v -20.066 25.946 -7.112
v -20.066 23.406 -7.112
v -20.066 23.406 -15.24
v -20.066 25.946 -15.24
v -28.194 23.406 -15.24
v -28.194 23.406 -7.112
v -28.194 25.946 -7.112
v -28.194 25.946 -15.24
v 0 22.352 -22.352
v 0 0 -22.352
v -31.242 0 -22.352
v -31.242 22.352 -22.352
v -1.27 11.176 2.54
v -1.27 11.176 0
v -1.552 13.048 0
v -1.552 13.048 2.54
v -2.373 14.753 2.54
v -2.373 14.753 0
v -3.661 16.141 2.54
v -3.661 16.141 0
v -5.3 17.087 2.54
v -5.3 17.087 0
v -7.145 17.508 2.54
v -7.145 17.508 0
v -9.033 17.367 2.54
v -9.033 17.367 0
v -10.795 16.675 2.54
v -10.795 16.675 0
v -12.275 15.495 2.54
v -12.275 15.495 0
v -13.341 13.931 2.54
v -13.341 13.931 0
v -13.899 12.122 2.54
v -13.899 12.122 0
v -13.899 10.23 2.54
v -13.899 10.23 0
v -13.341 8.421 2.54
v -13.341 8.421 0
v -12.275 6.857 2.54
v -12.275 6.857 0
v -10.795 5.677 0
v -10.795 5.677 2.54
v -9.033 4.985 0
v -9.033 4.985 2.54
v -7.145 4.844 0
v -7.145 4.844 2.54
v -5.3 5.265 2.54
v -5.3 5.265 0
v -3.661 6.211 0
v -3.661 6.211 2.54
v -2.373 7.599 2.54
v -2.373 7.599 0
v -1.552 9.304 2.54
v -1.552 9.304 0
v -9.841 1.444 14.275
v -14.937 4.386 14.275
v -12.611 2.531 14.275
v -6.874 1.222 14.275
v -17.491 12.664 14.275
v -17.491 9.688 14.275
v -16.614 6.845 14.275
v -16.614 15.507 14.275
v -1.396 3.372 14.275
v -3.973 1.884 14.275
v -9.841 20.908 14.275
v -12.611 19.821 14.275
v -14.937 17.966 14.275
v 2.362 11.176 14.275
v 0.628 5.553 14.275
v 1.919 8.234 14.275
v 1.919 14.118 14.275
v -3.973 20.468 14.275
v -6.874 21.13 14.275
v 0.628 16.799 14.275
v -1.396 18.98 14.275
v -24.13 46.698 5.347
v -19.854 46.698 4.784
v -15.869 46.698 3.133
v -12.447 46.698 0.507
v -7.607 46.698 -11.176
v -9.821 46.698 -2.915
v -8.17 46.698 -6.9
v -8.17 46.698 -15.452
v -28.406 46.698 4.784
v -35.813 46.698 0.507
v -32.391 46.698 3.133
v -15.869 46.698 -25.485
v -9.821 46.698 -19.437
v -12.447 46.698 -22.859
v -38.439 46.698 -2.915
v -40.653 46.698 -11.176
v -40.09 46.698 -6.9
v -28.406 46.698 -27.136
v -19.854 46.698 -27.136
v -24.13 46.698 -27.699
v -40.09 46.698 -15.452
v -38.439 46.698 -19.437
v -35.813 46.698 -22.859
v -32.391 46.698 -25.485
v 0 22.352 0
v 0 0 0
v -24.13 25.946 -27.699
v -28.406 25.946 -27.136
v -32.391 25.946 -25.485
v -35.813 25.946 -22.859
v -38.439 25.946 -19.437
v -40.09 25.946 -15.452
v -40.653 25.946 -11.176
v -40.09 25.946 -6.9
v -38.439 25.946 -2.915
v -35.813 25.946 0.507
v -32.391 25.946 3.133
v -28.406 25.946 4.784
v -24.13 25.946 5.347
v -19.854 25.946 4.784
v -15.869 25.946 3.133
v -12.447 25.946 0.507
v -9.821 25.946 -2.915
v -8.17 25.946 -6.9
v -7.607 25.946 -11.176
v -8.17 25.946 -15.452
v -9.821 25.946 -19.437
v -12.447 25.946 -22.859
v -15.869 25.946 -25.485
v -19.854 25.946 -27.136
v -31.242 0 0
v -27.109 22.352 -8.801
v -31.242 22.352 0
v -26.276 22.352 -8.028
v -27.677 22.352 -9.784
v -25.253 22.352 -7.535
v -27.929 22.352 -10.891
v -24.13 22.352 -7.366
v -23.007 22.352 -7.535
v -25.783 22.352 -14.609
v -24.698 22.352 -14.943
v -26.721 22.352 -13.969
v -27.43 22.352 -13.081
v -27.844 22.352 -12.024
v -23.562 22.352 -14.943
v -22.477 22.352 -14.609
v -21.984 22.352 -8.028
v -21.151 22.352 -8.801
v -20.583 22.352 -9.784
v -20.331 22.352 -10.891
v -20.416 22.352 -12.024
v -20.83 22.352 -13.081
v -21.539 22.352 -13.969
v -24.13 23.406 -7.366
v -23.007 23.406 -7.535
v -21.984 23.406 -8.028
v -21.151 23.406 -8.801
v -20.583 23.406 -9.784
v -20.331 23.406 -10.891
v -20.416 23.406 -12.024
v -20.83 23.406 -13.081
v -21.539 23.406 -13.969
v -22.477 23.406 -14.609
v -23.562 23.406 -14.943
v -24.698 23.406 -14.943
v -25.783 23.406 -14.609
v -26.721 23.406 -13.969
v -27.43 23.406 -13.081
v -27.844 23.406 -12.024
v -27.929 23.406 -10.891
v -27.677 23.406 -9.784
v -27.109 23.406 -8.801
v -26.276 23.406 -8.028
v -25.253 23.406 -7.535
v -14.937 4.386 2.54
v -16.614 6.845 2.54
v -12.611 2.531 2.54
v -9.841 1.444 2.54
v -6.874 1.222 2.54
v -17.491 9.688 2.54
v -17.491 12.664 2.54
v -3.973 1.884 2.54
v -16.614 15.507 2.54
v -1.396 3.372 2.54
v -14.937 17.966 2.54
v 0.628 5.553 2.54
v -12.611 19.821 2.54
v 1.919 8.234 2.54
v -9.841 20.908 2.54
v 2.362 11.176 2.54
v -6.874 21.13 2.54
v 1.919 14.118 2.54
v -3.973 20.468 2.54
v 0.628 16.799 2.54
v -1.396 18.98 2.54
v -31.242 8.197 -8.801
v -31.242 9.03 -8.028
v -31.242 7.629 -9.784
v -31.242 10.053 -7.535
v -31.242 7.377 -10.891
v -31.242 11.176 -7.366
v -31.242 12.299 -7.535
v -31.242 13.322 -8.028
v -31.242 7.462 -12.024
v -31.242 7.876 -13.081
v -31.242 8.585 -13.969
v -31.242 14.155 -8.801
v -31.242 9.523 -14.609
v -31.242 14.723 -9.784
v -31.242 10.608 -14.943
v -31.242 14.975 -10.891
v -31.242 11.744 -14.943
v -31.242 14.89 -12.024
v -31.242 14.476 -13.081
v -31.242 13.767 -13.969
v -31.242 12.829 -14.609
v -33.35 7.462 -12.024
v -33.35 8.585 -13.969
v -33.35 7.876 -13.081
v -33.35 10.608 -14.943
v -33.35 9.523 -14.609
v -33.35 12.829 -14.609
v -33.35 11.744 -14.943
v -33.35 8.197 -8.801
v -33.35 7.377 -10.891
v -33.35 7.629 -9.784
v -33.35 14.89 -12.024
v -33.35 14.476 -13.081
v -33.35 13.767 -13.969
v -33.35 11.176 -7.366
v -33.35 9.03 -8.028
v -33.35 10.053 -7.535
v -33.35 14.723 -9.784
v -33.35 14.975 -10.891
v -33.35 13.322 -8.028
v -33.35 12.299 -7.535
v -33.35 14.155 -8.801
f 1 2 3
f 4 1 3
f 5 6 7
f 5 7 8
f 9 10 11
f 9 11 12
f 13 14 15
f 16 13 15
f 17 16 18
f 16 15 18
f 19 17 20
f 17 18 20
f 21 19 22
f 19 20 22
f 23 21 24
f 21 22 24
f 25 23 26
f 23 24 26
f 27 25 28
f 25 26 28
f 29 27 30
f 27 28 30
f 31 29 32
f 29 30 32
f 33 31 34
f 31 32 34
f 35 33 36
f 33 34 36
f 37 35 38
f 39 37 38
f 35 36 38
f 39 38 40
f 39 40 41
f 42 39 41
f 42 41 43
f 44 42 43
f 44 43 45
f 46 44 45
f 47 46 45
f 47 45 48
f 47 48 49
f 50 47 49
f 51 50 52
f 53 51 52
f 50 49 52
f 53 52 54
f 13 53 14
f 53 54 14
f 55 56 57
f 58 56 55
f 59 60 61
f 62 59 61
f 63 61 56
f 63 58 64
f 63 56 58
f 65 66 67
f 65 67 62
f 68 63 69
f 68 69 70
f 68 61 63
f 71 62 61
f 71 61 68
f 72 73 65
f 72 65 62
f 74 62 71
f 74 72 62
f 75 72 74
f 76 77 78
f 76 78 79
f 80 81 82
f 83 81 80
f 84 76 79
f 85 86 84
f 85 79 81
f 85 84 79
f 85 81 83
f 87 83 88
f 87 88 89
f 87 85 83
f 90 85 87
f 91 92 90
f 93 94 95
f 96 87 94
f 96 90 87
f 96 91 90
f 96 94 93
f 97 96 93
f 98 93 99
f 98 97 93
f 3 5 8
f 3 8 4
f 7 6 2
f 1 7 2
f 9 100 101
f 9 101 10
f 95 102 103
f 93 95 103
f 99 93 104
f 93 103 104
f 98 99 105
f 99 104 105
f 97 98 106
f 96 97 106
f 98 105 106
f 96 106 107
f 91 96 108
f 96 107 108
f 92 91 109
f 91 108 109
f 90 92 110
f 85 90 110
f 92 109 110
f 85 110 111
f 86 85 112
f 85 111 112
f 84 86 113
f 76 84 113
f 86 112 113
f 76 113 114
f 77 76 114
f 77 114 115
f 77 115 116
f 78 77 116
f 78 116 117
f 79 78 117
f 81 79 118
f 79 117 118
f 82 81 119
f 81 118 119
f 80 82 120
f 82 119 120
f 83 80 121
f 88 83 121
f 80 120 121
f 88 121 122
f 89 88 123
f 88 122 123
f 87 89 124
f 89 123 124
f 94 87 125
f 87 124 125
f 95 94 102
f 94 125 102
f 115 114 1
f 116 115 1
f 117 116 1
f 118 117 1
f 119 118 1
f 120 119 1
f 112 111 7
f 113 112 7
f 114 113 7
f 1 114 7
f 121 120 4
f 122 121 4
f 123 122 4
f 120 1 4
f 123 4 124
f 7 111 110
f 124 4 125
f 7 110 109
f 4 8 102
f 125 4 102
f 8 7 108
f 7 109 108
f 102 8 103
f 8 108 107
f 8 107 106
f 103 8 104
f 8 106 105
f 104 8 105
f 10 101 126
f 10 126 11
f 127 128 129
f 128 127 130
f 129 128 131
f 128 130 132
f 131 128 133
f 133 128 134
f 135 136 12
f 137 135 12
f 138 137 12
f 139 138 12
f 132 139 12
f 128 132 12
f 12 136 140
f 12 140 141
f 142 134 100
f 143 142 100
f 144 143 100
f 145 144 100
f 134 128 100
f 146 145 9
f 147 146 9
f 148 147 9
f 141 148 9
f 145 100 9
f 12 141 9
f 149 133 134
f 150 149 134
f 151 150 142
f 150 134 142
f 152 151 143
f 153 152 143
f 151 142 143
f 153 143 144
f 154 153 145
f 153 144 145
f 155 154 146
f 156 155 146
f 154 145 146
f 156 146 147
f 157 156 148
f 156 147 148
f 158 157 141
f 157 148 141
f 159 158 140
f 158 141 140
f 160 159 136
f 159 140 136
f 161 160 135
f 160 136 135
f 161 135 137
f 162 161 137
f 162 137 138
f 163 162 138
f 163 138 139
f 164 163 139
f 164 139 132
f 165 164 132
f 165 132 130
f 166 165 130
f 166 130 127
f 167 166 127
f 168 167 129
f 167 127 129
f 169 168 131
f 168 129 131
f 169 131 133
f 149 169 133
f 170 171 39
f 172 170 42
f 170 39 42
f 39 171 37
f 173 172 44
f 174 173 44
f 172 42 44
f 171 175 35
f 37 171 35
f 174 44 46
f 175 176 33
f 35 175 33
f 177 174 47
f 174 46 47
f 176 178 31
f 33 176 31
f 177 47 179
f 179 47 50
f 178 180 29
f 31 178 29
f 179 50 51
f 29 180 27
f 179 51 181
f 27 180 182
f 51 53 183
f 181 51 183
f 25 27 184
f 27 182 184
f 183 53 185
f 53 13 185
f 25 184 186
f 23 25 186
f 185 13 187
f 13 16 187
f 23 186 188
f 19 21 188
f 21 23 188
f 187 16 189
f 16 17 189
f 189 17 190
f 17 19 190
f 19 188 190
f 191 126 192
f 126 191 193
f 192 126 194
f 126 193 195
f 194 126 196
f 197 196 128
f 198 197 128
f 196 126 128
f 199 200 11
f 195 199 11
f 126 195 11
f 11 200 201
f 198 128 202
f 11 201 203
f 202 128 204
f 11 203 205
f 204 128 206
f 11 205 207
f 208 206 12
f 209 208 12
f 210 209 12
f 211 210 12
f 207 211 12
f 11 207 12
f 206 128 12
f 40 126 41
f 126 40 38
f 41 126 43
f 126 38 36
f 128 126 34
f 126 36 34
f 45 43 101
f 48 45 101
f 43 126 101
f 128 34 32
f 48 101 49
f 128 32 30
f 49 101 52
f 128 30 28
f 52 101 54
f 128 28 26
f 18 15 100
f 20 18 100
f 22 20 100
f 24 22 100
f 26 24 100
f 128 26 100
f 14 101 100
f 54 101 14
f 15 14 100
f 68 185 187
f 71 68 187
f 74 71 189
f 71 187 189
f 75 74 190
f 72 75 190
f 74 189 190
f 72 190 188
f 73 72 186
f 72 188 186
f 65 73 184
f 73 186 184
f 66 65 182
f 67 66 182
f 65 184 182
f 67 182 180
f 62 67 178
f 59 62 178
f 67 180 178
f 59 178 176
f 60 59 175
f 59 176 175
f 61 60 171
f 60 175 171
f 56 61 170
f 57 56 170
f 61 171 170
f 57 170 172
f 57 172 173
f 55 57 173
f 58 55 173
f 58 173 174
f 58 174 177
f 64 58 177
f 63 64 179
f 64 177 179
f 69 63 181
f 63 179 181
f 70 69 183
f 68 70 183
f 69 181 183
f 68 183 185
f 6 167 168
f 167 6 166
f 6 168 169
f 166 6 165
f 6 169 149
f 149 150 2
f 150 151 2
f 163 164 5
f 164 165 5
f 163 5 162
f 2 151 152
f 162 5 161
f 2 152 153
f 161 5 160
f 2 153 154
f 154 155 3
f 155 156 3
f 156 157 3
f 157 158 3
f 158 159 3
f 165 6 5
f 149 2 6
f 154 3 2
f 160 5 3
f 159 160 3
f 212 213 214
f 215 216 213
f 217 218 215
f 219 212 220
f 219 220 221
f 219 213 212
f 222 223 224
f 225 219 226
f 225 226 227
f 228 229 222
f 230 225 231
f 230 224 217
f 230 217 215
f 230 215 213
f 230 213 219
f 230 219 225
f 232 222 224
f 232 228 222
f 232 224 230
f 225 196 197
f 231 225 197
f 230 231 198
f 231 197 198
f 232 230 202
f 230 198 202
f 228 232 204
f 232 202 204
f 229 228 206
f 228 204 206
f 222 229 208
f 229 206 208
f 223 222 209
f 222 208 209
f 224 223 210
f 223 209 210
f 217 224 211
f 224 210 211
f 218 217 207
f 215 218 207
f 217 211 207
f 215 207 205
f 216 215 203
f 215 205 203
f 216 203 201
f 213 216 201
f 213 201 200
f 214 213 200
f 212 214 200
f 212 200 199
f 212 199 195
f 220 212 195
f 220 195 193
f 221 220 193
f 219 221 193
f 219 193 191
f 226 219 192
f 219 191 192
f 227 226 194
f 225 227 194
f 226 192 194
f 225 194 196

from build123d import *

# Parameters (mm, degrees)
SKETCH1_W           = 22.352
SKETCH1_H           = 22.352
BOSS_EXTRUDE1_DEPTH = 31.242
SKETCH2_R           = 3.81
BOSS_EXTRUDE2_DEPTH = 1.0541
SKETCH3_W           = 8.128
SKETCH3_H           = 8.128
BOSS_EXTRUDE3_DEPTH = 2.54
SKETCH4_R           = 16.5227
BOSS_EXTRUDE4_DEPTH = 20.7518
SKETCH5_R           = 3.81
BOSS_EXTRUDE5_DEPTH = 2.1082
SKETCH6_R           = 6.35
BOSS_EXTRUDE7_DEPTH = 2.54
SKETCH7_R           = 9.9822
BOSS_EXTRUDE8_DEPTH = 11.7348


with BuildPart() as part:
    # Sketch1 → Boss-Extrude1 (new body)
    with BuildSketch(Plane(origin=(0, 0, 0), x_dir=(0, 0, -1), z_dir=(1, 0, 0))):
        with Locations((11.176, 11.176)):
            Rectangle(SKETCH1_W, SKETCH1_H)
    extrude(amount=-BOSS_EXTRUDE1_DEPTH)

    # Sketch2 → Boss-Extrude2 (add)
    with BuildSketch(Plane(origin=(0, 22.352, 0), x_dir=(1, 0, 0), z_dir=(0, 1, 0))):
        with Locations(Location((-24.13, 11.176, 0), (0, 0, 270))):
            Circle(SKETCH2_R)
    extrude(amount=BOSS_EXTRUDE2_DEPTH)

    # Sketch3 → Boss-Extrude3 (add)
    with BuildSketch(Plane(origin=(0, 23.4061, 0), x_dir=(1, 0, 0), z_dir=(0, 1, 0))):
        with Locations((-24.13, 11.176)):
            Rectangle(SKETCH3_W, SKETCH3_H)
    extrude(amount=BOSS_EXTRUDE3_DEPTH)

    # Sketch4 → Boss-Extrude4 (add)
    with BuildSketch(Plane(origin=(0, 25.9461, 0), x_dir=(1, 0, 0), z_dir=(0, 1, 0))):
        with Locations(Location((-24.13, 11.176, 0), (0, 0, 90))):
            Circle(SKETCH4_R)
    extrude(amount=BOSS_EXTRUDE4_DEPTH)

    # Sketch5 → Boss-Extrude5 (add)
    with BuildSketch(Plane.ZY.offset(31.242)):
        with Locations((-11.176, 11.176)):
            Circle(SKETCH5_R)
    extrude(amount=BOSS_EXTRUDE5_DEPTH)

    # Sketch6 → Boss-Extrude7 (add)
    with BuildSketch(Plane.XY):
        with Locations((-7.62, 11.176)):
            Circle(SKETCH6_R)
    extrude(amount=BOSS_EXTRUDE7_DEPTH)

    # Sketch7 → Boss-Extrude8 (add)
    with BuildSketch(Plane.XY.offset(2.54)):
        with Locations((-7.62, 11.176)):
            Circle(SKETCH7_R)
    extrude(amount=BOSS_EXTRUDE8_DEPTH)


solid = part.part
